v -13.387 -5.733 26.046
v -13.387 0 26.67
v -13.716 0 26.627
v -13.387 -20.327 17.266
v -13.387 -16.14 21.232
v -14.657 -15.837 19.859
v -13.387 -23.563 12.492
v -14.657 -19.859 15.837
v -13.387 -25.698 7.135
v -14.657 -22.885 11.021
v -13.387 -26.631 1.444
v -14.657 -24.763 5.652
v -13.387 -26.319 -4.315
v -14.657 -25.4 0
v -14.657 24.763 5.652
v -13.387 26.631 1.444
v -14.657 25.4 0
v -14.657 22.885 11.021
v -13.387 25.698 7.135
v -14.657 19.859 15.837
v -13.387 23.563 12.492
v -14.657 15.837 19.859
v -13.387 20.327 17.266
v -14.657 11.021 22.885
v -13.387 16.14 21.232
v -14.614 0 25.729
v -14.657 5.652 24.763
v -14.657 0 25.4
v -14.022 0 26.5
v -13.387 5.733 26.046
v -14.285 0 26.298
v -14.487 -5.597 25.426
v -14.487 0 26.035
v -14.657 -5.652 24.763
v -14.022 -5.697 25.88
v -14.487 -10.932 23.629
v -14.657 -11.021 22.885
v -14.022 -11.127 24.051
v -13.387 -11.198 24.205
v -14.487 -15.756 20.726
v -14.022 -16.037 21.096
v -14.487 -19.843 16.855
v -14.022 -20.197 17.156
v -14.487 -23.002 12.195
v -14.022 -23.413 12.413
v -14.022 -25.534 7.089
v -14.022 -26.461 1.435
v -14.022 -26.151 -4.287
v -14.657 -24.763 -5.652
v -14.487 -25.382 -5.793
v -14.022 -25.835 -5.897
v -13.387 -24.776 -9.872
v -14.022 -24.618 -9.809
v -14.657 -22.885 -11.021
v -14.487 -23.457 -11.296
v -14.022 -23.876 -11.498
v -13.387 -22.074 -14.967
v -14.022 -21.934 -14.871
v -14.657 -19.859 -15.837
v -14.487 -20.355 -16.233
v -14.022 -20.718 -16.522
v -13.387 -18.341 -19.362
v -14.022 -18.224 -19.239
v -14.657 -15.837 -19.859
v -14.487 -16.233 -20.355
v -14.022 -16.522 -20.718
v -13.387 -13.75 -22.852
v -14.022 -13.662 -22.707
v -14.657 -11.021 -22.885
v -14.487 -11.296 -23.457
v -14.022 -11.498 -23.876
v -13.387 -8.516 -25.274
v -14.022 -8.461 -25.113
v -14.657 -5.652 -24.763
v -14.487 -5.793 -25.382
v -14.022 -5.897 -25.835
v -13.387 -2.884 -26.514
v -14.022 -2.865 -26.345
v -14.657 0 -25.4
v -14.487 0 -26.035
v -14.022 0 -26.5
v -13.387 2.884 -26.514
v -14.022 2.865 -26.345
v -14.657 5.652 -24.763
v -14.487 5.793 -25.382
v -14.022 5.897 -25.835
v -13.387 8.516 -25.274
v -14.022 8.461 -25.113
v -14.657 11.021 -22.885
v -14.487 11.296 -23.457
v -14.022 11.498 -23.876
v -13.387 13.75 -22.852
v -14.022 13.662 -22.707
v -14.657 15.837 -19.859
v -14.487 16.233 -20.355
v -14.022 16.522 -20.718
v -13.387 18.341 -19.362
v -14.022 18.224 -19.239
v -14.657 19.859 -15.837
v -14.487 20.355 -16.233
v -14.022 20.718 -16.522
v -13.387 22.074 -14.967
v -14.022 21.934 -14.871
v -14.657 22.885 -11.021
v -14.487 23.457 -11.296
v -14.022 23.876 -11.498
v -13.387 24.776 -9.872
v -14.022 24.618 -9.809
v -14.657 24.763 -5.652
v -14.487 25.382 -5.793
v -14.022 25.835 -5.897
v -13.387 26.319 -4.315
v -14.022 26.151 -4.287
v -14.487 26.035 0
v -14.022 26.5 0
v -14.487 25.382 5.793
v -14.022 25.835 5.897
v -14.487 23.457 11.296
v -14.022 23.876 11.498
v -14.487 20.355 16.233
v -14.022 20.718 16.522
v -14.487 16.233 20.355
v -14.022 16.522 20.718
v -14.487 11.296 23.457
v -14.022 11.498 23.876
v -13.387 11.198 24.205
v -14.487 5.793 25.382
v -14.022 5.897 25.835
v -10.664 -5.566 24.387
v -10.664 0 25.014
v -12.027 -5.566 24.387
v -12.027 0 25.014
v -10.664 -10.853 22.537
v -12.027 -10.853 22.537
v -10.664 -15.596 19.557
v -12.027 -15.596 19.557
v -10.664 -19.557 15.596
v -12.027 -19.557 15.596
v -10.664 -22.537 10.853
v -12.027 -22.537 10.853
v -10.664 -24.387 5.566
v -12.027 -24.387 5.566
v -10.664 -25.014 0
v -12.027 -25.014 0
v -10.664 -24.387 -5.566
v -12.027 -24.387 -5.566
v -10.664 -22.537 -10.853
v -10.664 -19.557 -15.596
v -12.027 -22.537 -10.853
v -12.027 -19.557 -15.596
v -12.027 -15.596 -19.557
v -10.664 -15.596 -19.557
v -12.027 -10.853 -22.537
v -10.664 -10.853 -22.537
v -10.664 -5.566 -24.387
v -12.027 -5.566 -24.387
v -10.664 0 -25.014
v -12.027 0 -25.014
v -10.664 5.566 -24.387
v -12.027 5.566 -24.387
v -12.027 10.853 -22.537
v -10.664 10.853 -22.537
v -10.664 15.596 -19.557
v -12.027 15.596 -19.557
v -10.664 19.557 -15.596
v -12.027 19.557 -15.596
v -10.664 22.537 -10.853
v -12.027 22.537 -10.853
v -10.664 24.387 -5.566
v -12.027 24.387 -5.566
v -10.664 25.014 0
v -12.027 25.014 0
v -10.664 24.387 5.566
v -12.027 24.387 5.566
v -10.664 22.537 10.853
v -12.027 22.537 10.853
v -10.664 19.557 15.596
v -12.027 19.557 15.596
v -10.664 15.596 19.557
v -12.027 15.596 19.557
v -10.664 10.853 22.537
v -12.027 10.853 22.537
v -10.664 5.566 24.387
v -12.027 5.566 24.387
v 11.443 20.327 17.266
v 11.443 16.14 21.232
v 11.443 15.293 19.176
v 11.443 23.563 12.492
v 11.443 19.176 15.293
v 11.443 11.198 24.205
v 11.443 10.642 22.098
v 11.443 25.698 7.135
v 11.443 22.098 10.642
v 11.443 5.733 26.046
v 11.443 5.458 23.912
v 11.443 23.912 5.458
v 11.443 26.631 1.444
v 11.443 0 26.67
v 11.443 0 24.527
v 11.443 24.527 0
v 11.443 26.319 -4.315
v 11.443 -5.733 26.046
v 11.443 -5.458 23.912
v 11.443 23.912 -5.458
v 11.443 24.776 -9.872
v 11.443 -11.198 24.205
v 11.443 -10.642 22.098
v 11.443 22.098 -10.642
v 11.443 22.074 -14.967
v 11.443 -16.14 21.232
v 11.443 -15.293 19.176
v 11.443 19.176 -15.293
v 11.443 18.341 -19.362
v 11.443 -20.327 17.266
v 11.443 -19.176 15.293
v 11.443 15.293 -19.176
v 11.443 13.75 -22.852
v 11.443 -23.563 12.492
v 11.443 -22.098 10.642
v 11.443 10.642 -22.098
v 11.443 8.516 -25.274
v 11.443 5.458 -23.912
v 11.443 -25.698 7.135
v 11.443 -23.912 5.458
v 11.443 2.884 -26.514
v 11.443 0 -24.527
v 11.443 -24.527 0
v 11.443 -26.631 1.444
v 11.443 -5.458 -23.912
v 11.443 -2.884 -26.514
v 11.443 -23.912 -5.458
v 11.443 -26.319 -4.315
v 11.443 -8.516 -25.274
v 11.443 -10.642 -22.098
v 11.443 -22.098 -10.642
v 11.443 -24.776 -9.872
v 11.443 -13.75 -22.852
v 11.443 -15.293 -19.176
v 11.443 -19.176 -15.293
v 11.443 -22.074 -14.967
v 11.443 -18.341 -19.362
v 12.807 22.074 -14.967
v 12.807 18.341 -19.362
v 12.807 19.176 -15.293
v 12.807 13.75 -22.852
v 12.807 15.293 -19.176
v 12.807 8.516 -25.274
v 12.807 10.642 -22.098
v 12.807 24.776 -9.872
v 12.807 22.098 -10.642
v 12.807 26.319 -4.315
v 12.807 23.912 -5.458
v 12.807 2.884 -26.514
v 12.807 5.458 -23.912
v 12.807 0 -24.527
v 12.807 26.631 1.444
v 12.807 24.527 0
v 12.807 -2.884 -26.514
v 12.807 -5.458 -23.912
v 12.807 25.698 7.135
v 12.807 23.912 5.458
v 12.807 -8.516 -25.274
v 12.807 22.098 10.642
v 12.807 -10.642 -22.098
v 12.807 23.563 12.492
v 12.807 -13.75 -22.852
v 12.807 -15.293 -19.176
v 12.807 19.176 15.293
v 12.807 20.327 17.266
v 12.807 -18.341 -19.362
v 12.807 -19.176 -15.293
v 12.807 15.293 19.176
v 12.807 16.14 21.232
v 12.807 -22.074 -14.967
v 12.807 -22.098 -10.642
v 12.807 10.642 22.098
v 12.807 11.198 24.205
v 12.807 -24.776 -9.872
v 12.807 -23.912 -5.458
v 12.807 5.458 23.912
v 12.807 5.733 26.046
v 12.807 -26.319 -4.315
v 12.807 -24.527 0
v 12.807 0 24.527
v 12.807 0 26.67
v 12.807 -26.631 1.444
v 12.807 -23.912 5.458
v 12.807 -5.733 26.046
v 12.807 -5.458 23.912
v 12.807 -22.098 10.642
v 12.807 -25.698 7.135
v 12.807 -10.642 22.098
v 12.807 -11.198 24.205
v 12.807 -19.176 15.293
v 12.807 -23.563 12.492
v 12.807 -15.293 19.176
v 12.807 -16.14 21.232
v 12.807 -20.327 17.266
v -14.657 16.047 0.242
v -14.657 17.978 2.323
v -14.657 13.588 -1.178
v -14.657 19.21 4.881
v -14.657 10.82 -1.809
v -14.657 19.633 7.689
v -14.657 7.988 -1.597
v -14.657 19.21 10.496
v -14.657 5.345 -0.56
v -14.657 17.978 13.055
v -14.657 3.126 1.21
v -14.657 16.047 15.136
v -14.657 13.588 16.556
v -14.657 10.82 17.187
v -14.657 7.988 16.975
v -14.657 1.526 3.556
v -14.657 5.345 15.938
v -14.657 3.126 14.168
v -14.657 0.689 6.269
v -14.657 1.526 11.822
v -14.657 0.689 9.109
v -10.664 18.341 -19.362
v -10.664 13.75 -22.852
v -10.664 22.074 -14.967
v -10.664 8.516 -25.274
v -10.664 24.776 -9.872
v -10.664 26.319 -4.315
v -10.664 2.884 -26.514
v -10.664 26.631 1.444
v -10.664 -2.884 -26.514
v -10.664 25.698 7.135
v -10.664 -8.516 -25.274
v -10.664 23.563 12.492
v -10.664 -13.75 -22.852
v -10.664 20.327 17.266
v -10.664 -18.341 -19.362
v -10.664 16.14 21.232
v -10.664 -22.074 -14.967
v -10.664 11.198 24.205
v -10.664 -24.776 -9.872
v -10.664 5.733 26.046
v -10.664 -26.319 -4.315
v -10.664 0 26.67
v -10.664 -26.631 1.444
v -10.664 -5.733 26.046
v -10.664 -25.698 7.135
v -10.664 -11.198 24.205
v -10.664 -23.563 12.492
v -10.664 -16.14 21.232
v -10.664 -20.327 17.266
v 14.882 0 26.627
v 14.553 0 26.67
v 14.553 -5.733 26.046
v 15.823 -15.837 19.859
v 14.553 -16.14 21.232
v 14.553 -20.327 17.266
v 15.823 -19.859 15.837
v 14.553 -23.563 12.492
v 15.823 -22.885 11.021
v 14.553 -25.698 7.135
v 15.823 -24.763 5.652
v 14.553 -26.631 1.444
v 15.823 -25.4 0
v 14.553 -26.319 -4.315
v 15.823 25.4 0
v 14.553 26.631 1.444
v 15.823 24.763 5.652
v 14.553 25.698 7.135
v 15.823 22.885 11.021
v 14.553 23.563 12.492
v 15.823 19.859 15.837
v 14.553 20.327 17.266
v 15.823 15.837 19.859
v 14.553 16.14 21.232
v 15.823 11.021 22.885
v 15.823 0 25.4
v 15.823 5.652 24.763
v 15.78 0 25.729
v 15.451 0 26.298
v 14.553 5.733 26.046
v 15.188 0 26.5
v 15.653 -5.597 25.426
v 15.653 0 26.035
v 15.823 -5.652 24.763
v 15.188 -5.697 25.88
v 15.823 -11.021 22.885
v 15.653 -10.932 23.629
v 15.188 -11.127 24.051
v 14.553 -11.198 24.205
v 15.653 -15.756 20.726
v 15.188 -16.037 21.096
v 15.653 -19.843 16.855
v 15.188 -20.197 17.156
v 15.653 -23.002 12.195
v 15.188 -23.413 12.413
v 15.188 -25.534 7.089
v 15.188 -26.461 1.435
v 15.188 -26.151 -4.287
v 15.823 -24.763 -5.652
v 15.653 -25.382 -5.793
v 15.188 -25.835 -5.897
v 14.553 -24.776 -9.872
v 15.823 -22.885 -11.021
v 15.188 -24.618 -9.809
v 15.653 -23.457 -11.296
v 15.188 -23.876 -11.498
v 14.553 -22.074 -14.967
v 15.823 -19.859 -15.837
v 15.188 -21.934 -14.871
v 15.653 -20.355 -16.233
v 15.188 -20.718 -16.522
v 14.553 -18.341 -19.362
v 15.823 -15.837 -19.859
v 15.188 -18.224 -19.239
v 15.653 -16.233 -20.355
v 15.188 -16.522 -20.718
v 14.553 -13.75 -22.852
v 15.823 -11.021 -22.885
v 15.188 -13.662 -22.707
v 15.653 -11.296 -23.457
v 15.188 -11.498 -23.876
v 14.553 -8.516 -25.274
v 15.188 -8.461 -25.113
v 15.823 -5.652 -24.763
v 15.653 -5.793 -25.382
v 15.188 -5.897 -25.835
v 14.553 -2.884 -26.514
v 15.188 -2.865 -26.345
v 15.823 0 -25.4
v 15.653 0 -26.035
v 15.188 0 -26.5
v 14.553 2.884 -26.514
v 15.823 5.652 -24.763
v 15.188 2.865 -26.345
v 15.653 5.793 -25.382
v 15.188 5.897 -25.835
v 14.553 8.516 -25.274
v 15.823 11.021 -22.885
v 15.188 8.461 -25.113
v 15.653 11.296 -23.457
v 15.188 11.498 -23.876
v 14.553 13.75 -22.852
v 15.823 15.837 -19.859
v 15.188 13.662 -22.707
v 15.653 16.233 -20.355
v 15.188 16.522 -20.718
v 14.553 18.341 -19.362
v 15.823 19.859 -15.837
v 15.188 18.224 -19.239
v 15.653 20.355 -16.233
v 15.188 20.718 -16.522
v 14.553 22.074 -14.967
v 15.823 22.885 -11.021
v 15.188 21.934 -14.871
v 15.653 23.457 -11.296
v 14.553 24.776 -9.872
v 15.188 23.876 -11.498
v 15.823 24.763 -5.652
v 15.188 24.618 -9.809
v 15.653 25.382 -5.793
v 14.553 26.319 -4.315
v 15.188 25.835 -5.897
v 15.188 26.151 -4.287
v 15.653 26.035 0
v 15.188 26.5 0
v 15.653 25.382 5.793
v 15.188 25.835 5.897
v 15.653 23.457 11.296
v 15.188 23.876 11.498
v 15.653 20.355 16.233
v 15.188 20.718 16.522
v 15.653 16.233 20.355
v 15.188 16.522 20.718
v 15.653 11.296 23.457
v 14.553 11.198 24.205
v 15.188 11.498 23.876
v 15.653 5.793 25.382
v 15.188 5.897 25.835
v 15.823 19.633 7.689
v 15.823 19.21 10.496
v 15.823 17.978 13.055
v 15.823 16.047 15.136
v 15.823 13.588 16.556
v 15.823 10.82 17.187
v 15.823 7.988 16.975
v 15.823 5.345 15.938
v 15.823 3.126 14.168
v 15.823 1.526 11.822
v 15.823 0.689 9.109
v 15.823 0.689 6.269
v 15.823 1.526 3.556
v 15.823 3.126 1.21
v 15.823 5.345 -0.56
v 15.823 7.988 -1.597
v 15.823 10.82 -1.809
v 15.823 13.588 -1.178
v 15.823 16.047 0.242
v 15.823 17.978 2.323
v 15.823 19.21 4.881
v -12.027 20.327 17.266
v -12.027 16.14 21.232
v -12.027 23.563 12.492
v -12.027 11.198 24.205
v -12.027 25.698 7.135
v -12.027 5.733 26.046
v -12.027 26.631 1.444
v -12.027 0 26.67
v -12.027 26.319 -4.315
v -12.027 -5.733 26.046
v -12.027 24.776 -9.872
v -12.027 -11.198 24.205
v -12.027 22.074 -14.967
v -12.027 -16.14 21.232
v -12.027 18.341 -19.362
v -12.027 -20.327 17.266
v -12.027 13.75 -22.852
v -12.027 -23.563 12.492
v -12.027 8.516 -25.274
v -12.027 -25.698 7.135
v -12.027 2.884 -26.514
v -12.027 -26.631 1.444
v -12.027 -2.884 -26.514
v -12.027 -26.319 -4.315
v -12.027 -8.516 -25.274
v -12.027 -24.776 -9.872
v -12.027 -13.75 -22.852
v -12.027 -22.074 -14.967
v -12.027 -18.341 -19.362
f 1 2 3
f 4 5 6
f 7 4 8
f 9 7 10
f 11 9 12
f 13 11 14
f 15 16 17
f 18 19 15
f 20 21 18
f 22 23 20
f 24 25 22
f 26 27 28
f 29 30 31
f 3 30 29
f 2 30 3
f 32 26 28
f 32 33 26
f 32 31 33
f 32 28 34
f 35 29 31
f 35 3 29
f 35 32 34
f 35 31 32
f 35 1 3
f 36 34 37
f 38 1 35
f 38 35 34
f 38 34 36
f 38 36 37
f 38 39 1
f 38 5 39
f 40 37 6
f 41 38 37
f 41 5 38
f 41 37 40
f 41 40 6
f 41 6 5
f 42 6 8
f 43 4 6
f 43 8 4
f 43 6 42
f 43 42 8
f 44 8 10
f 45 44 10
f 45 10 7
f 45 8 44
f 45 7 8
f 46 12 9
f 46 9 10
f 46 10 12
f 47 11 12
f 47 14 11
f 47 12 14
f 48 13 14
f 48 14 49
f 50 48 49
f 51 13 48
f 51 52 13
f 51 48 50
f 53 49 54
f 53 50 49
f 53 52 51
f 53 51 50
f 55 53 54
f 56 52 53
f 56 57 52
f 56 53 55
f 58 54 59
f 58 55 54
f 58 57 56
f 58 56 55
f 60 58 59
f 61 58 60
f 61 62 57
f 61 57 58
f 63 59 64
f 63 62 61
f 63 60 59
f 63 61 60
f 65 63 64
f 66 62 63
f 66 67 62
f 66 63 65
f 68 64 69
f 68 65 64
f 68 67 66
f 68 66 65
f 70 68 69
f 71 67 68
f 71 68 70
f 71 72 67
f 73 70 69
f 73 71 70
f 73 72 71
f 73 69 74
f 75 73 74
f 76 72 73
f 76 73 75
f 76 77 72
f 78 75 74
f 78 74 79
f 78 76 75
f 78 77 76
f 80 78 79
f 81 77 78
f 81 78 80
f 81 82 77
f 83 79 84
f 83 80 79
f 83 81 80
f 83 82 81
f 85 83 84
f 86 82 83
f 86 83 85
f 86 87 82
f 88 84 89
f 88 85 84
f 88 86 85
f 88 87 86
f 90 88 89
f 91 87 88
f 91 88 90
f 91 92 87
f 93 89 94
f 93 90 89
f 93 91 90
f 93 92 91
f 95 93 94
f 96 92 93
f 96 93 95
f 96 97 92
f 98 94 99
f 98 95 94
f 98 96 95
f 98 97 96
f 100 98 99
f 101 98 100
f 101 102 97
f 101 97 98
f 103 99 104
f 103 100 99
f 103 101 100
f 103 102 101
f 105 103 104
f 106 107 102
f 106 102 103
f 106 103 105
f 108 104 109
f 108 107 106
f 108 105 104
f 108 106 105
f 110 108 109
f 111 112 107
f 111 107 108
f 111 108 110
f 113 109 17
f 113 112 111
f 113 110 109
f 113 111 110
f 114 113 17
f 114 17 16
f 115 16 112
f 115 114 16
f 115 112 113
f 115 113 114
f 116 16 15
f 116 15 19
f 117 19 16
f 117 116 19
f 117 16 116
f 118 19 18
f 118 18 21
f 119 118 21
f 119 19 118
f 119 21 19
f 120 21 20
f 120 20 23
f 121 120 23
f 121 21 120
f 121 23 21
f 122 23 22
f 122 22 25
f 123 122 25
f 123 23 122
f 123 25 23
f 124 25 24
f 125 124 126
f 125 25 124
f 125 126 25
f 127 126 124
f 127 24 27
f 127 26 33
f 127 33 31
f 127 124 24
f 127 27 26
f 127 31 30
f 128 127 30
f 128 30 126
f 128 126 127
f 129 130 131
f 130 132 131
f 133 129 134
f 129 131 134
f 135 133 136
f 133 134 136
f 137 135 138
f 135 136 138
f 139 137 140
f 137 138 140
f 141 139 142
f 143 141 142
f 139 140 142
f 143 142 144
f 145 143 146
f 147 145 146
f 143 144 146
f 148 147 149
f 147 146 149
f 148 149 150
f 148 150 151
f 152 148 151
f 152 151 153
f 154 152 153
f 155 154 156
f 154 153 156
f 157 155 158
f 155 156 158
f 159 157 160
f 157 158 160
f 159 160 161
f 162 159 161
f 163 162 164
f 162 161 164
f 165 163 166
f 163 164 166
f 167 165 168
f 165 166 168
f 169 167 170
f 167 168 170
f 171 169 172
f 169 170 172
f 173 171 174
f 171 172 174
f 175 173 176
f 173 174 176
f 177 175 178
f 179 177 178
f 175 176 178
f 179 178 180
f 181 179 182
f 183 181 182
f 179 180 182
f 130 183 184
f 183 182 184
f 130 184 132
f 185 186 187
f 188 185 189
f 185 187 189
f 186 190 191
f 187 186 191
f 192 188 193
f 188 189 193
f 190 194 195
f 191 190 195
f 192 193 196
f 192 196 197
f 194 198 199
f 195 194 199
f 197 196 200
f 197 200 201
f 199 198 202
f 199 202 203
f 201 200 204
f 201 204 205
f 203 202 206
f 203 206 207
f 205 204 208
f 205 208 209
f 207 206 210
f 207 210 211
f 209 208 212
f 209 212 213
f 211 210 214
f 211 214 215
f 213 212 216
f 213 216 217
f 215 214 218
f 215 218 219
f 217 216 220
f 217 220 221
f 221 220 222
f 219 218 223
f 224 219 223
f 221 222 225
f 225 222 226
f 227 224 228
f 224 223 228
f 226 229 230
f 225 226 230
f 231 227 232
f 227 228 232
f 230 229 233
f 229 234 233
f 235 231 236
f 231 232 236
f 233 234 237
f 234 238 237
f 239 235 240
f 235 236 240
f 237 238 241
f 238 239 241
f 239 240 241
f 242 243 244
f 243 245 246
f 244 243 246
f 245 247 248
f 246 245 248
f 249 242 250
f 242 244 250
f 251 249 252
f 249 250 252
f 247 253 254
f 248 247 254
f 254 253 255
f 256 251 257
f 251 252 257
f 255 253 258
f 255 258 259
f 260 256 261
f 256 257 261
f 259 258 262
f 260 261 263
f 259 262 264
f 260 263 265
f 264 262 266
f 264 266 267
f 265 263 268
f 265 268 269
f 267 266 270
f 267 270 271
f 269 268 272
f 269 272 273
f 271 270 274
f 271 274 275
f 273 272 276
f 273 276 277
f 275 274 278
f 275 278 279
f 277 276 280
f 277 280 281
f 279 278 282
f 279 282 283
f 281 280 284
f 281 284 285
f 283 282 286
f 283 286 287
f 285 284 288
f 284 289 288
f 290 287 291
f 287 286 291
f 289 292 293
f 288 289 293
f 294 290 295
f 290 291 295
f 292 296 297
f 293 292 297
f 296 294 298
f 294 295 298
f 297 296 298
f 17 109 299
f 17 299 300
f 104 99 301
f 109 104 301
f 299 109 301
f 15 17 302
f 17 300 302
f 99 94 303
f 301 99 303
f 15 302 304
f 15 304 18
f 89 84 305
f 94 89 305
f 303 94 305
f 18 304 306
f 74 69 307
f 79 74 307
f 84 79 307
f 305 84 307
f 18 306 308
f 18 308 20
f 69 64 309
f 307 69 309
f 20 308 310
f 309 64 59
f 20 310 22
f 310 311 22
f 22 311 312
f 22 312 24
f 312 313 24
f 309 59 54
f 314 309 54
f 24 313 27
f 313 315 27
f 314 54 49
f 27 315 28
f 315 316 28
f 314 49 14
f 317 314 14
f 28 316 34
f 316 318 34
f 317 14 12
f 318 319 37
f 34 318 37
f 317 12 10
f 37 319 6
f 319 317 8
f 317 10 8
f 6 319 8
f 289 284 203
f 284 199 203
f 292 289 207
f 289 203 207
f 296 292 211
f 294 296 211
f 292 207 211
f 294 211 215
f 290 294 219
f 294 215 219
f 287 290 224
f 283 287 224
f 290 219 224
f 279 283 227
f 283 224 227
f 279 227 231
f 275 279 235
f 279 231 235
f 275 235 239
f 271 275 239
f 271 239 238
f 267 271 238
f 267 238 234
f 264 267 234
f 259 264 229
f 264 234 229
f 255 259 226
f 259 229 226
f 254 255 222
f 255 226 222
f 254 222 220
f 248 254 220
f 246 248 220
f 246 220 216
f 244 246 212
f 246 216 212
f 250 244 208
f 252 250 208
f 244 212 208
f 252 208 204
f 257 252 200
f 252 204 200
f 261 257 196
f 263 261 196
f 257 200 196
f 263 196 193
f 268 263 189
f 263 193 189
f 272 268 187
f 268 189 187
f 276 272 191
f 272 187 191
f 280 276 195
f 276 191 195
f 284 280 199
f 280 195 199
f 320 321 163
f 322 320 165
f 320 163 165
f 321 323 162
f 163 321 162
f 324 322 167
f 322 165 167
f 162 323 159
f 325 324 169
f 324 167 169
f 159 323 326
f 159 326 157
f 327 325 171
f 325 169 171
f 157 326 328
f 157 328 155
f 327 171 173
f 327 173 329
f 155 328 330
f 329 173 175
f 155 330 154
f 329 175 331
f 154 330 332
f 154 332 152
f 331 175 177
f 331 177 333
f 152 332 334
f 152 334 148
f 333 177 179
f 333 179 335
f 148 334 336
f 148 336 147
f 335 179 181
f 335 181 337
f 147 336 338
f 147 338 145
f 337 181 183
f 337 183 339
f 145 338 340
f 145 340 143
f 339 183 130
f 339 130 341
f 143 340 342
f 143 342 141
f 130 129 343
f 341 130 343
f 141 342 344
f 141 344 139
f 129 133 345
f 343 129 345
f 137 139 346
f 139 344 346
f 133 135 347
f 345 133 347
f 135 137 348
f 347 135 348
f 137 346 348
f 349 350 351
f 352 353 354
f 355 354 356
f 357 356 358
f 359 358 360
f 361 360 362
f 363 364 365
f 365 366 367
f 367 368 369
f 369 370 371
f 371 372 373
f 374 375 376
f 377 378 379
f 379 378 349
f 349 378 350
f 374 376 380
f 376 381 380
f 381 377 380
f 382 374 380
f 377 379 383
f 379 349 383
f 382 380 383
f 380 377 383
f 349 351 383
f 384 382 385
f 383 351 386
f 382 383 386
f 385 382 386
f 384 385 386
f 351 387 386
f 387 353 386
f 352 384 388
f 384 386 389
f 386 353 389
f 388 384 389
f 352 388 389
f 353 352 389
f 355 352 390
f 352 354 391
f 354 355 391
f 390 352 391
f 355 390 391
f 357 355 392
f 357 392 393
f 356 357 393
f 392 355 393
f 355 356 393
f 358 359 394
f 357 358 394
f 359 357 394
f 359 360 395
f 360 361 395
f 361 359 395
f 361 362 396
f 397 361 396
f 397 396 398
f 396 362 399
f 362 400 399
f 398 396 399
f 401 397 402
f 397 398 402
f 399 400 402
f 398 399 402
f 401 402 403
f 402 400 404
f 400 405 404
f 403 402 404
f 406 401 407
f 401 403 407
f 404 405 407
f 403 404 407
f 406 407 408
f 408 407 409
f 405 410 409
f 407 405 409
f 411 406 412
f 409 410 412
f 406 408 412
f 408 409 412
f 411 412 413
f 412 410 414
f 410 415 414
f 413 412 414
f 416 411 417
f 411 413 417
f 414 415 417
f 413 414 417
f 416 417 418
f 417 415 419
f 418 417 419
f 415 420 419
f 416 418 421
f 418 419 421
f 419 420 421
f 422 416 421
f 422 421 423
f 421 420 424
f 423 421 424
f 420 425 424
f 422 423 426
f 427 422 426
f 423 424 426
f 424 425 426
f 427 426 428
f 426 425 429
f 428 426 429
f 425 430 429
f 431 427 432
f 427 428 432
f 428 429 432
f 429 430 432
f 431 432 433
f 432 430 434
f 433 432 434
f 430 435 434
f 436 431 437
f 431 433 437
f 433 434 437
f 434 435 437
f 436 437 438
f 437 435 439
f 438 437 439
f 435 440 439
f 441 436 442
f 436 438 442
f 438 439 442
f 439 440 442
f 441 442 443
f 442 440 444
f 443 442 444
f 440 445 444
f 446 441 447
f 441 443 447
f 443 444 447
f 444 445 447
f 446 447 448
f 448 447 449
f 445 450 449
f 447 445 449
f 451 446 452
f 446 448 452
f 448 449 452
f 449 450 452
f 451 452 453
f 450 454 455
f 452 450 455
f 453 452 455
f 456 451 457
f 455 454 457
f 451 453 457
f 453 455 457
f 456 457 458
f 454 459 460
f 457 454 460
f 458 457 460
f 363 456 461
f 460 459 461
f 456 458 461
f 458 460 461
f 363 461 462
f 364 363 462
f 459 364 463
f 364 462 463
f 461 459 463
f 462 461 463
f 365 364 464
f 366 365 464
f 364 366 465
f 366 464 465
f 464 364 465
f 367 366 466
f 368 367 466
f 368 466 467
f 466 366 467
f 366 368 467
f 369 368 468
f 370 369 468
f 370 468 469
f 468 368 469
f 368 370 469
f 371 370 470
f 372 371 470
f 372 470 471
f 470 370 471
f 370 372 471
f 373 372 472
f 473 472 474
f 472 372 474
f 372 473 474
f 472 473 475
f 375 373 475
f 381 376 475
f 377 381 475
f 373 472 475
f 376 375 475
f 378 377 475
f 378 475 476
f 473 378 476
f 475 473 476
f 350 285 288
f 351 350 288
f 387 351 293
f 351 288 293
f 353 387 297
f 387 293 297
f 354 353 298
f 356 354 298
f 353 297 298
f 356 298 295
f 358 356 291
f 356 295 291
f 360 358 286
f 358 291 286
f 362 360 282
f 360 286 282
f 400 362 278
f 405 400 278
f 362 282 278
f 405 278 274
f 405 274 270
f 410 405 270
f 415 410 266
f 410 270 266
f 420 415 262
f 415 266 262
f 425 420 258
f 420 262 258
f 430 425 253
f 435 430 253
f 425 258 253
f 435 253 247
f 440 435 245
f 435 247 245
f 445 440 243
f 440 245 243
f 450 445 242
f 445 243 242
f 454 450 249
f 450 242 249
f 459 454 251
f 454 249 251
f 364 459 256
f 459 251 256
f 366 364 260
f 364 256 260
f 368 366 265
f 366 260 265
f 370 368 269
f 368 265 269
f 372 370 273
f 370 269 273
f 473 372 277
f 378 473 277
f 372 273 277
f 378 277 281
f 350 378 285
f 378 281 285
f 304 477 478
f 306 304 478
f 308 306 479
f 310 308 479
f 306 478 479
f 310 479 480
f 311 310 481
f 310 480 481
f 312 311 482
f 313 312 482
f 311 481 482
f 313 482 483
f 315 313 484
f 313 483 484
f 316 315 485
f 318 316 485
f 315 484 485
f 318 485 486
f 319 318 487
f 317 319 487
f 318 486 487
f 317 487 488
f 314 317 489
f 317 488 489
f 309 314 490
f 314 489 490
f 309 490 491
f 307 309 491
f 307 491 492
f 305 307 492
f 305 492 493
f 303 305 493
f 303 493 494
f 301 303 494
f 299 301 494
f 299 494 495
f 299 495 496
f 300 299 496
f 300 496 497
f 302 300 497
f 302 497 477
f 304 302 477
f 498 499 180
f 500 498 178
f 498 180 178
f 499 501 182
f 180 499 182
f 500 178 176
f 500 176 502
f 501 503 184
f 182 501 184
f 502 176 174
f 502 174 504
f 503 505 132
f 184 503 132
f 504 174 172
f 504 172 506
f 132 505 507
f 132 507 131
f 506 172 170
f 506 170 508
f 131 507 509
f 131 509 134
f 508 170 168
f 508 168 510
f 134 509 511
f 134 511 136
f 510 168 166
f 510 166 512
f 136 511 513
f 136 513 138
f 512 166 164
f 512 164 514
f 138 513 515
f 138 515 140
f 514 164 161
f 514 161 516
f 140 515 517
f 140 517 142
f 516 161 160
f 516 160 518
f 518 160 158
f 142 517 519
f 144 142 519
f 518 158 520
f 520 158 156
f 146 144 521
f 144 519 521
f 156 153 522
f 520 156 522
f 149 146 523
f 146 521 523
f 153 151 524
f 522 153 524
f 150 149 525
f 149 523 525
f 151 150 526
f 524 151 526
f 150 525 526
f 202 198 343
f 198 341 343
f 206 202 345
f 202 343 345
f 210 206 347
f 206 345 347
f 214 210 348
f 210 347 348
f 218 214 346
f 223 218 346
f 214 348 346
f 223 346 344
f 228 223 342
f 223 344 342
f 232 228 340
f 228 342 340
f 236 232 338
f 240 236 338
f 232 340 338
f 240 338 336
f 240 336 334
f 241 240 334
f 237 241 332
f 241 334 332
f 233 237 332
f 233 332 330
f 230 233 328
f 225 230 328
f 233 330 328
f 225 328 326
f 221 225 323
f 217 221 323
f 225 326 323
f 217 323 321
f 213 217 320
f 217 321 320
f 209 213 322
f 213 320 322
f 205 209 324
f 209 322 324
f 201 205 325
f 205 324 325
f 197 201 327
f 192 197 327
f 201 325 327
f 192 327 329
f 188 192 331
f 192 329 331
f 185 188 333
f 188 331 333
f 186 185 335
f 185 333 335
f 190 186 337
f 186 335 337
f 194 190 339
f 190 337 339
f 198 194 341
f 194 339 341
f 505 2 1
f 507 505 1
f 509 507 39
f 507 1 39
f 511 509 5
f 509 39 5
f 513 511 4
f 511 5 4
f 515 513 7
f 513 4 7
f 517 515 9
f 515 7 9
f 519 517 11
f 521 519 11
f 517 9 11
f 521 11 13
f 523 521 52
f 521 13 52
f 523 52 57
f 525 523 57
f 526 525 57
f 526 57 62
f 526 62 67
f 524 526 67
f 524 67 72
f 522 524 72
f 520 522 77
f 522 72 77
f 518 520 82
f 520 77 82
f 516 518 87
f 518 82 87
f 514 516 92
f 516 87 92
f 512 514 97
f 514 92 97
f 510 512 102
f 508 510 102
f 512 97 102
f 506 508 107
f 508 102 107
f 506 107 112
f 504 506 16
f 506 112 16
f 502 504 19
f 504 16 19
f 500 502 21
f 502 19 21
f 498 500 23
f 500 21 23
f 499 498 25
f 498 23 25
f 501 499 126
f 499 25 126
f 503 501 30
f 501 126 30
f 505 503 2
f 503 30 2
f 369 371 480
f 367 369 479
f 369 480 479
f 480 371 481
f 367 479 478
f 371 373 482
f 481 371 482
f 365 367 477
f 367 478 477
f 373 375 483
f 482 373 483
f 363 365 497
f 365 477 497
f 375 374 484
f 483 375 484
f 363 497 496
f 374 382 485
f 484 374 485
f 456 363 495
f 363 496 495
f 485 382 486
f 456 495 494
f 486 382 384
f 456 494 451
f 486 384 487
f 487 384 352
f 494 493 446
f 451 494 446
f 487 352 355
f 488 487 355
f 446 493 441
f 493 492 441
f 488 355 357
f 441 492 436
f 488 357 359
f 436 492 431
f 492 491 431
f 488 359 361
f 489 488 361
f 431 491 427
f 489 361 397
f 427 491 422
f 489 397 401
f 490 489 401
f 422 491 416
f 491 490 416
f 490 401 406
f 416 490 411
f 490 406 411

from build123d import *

# Parameters (mm, degrees)
F2_R     = 1.27
F3_R     = 9.525
F4_DEPTH = 30.481


with BuildPart() as f1:
    # F0 (on Front) → F1 (revolve)
    with BuildSketch(Plane.XZ):
        Polygon((-14.656985, 26.67), (-14.656985, 0), (15.823015, 0), (15.823015, 26.67), (12.806601, 26.67), (12.806601, 24.527449), (11.443161, 24.527449), (11.443161, 26.67), (-10.664052, 26.67), (-10.664052, 25.014395), (-12.027493, 25.014395), (-12.027493, 26.67), align=None)
    revolve(axis=Axis((0.34086, 0, 0), (1, 0, 0)))

    # F2
    f2_edges = [f1.edges().sort_by_distance(p)[0] for p in [
        (-14.656985, 0, -26.67),
        (15.823015, 0, -26.67),
    ]]
    fillet(f2_edges, radius=F2_R)

    # F3 (on face) → F4 (cut, through all)
    with BuildSketch(Plane.YZ.offset(15.823015)):
        with Locations((10.10793, 7.688937)):
            Circle(F3_R)
    extrude(amount=-F4_DEPTH, mode=Mode.SUBTRACT)


solid = f1.part
